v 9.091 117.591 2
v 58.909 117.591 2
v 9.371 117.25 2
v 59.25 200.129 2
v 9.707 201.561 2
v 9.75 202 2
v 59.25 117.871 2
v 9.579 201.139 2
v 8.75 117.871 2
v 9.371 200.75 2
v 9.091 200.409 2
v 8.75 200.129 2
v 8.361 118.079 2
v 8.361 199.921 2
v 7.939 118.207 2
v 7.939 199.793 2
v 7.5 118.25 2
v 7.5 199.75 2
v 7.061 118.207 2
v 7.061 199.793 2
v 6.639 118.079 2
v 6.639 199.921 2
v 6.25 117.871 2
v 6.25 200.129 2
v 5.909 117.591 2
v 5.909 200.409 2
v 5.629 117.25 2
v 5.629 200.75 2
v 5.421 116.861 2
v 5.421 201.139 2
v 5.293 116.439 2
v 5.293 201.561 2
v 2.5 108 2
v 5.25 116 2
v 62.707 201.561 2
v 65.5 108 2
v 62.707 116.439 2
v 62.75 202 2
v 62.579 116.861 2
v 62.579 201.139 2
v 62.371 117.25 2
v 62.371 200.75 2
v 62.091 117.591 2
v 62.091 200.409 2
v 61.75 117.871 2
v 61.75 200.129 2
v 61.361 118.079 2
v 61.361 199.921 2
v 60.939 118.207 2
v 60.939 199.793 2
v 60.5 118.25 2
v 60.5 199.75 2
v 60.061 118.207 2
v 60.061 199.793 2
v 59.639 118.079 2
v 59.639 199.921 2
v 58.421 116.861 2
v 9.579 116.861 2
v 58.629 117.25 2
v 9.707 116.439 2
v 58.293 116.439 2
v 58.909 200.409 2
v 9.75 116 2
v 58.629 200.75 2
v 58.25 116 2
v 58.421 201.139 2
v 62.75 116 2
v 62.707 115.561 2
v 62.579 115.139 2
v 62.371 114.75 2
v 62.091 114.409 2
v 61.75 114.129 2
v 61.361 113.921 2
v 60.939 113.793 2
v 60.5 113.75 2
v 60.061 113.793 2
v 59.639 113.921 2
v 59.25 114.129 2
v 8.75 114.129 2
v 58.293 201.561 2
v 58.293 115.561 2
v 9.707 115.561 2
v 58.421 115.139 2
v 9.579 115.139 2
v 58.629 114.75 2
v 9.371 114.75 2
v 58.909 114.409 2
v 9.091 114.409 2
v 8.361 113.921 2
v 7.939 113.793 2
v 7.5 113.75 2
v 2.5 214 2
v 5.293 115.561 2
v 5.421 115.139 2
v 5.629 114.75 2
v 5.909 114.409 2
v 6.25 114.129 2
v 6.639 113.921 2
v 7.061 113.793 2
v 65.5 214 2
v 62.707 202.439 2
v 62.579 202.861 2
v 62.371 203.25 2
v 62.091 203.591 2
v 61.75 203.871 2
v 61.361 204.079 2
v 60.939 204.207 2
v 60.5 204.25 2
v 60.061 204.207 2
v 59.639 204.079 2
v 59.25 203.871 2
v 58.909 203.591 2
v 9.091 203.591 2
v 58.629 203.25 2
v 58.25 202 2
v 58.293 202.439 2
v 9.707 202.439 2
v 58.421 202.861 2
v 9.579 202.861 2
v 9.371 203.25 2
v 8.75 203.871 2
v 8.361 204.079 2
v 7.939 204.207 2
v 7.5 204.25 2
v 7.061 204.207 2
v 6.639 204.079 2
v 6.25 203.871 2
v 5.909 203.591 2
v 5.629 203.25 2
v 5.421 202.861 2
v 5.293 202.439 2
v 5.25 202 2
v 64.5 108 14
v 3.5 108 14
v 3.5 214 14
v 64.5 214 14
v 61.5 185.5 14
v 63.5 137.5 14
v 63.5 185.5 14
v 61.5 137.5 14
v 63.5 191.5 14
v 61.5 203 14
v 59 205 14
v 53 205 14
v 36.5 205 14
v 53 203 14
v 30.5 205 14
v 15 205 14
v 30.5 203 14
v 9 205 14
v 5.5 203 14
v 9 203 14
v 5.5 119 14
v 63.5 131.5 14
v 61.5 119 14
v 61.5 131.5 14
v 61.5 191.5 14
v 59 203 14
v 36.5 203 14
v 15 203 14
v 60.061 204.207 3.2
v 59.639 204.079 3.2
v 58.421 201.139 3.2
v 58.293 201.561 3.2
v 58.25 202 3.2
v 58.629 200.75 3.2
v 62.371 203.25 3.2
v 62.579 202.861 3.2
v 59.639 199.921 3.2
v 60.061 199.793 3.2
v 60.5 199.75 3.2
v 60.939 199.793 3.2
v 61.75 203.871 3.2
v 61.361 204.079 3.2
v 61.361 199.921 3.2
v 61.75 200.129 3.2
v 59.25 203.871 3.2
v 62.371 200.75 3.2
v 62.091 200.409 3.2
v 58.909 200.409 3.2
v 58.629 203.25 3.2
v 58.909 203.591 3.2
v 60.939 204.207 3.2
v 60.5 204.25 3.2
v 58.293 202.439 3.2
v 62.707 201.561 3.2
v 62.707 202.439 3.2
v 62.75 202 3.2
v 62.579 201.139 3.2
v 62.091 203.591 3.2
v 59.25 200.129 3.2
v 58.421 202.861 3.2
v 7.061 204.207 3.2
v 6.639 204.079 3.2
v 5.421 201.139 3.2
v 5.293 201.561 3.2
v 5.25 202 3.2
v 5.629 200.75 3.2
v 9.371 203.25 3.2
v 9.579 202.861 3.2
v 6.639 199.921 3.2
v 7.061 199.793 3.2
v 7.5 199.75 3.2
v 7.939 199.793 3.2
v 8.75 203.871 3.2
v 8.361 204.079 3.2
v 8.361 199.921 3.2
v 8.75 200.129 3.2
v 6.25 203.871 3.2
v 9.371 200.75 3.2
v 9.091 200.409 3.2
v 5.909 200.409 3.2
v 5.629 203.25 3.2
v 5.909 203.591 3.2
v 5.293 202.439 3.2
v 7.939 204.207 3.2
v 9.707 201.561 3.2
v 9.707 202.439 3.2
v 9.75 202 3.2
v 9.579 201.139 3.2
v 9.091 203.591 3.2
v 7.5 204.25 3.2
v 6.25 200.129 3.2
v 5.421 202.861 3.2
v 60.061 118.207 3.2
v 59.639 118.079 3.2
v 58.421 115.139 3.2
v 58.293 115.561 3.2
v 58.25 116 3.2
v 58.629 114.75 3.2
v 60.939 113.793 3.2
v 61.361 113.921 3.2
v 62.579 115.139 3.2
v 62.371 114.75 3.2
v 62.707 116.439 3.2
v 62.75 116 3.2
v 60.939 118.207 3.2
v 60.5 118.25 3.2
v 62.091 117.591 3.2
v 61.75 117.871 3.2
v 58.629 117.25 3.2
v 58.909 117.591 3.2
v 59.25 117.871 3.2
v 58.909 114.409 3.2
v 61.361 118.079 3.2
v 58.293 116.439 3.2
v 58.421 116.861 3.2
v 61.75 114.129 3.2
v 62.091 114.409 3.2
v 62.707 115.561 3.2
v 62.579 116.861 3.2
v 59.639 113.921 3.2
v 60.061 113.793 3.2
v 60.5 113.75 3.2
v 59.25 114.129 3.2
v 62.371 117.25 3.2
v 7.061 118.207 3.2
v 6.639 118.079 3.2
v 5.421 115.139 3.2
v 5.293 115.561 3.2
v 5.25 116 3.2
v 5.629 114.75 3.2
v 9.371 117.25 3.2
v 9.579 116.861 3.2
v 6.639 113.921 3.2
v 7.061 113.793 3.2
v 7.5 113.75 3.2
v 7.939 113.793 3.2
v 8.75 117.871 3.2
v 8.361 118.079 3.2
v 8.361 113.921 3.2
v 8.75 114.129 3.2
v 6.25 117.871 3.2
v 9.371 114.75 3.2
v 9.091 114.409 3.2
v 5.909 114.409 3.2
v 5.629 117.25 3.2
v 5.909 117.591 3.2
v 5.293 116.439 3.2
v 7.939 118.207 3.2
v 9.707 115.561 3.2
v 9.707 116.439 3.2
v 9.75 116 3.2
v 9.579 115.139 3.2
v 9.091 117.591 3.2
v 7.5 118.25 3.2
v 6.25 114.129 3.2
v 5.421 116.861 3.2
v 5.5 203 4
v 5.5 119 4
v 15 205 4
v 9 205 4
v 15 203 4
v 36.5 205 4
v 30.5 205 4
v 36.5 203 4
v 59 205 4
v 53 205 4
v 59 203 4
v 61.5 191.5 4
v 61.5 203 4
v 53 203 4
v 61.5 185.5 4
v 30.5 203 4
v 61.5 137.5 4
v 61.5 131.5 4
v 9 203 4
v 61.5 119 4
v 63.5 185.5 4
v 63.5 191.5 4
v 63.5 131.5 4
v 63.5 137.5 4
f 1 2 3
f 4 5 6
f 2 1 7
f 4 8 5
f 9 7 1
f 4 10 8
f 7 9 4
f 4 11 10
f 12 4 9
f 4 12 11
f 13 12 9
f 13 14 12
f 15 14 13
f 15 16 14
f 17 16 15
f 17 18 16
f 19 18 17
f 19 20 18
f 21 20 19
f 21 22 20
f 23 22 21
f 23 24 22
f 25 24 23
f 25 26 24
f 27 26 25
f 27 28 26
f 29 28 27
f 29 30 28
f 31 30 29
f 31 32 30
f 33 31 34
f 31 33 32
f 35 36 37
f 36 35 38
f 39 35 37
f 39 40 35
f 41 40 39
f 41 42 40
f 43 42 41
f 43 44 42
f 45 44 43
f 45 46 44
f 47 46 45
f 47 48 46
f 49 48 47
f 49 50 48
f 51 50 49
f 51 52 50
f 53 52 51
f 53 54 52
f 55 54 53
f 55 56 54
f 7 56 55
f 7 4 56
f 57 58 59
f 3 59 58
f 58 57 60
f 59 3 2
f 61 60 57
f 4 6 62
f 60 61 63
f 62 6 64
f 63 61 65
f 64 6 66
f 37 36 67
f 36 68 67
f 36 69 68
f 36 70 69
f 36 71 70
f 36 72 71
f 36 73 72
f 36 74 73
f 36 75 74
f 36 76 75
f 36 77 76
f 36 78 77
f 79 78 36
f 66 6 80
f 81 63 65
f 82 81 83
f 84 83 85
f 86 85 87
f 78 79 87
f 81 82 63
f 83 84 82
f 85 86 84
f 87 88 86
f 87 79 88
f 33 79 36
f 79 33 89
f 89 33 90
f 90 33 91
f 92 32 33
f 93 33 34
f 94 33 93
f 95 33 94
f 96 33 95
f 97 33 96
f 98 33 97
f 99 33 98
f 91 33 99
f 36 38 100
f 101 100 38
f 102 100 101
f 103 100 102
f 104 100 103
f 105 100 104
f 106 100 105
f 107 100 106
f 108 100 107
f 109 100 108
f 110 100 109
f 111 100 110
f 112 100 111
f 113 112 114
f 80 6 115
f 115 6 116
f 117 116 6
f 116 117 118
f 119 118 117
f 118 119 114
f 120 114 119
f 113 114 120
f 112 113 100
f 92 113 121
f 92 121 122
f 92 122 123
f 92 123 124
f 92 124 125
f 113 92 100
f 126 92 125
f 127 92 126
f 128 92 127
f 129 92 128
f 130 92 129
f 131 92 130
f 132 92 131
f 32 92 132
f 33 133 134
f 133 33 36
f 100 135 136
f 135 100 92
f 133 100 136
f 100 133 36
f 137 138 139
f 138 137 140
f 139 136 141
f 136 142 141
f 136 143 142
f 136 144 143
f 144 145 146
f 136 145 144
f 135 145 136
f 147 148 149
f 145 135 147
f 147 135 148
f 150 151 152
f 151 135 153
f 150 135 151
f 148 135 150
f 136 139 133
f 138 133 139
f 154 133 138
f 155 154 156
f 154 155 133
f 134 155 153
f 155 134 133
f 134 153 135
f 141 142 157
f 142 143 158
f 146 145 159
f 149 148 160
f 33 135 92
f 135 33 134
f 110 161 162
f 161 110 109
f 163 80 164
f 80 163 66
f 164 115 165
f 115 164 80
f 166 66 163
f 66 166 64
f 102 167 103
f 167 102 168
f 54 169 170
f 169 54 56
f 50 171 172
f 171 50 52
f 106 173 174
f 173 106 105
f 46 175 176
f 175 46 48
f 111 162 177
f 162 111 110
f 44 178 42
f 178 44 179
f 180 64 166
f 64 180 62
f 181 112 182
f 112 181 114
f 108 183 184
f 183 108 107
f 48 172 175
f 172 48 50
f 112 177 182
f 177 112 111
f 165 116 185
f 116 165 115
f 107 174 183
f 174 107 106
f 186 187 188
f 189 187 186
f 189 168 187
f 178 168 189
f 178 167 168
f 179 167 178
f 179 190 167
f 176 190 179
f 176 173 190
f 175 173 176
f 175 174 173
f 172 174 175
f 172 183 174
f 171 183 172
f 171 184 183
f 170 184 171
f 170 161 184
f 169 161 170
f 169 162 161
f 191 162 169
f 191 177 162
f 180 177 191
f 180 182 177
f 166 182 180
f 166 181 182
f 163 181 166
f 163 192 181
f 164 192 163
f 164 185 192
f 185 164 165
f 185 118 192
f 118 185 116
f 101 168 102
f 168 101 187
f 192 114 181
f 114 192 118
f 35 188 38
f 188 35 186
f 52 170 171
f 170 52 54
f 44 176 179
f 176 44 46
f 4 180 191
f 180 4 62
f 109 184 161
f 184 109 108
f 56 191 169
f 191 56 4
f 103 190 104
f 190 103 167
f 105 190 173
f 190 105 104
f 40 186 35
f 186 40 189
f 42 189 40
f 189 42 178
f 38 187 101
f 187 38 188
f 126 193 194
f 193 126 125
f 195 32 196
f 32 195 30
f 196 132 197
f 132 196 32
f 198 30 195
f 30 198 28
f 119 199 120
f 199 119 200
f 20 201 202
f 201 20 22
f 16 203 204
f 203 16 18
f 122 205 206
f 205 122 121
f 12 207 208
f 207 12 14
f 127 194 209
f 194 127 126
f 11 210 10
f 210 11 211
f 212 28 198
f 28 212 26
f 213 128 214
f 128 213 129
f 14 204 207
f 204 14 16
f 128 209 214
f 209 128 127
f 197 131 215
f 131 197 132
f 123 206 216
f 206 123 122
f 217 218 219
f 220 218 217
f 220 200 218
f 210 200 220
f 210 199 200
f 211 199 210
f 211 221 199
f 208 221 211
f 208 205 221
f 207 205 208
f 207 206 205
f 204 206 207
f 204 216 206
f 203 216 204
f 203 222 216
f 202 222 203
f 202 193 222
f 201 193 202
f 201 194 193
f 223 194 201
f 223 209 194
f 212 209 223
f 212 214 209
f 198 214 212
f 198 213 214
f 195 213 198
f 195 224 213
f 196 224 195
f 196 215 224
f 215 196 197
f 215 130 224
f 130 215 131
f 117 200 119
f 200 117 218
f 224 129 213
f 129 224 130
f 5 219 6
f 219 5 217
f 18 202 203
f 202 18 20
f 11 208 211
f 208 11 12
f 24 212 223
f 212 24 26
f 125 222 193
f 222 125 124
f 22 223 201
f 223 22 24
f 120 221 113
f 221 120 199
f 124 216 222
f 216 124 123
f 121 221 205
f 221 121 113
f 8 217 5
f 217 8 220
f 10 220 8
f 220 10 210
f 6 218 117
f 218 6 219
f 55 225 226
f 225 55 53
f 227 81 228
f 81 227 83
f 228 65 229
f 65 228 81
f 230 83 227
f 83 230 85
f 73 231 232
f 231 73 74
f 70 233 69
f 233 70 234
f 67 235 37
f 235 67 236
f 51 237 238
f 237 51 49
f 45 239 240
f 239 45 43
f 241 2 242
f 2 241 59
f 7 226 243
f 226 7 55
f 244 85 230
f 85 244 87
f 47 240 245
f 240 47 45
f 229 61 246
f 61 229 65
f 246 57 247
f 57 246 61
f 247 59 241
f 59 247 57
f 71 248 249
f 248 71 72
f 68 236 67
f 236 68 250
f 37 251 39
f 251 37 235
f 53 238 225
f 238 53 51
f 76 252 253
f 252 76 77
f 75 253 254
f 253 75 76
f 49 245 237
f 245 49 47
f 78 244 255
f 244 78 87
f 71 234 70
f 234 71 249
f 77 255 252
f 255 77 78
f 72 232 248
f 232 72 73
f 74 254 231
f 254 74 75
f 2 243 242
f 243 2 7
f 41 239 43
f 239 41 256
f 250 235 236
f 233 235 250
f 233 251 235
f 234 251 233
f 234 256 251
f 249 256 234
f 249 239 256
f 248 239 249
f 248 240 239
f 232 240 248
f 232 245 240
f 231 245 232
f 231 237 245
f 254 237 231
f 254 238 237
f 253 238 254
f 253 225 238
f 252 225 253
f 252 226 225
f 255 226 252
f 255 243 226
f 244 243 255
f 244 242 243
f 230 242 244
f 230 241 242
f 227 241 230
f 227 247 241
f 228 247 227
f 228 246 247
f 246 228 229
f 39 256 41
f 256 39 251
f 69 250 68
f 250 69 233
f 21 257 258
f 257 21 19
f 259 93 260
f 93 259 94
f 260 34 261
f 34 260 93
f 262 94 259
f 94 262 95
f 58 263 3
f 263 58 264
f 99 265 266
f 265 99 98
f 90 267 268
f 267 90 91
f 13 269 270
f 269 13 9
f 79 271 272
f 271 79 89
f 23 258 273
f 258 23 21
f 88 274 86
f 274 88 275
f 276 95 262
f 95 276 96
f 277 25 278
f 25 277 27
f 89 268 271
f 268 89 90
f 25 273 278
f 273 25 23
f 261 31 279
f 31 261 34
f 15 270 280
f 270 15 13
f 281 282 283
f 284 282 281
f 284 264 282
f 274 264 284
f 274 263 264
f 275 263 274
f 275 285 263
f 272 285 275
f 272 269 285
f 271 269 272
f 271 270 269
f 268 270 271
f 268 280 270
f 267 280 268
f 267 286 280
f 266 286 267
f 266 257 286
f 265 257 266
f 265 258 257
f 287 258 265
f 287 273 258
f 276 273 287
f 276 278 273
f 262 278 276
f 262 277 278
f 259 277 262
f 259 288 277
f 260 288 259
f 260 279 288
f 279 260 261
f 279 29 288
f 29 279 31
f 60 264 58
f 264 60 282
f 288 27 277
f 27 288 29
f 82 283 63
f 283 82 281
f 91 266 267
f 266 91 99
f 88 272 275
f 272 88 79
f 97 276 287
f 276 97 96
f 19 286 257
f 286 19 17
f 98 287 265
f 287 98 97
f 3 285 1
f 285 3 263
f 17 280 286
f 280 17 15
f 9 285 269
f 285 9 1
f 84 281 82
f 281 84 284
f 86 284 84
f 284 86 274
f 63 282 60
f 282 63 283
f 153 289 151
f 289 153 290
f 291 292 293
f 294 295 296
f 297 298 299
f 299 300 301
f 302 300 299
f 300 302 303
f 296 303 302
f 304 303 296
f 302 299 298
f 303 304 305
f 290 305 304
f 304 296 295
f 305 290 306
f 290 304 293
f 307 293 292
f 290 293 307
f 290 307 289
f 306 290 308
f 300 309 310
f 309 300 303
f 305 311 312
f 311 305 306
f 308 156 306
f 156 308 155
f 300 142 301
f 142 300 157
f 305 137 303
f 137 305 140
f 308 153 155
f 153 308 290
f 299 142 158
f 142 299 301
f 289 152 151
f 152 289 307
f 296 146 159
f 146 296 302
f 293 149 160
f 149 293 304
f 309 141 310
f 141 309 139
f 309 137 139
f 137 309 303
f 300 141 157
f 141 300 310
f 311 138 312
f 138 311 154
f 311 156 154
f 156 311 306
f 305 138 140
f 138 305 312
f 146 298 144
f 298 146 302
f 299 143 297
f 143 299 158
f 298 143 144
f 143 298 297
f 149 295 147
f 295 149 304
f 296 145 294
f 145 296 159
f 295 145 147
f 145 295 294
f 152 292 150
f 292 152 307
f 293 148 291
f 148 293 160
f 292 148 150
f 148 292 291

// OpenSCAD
// file: Commons.scad
arduino_depth = 53.5;
arduino_width = 69;
arduino_mega_width = 102;

raspberry_depth = 56;
raspberry_width = 85;

breadboard_width = 166;
breadboard_depth = 55;
breadboard_height = 10;

mini_breadboard_depth = 34;
mini_breadboard_width = 46;

magnet_height = 1.2;
magnet_diameter = 4;

delta = 0.5;

plate_thickness = 2;
wall_thickness = 2;

slot_width = arduino_mega_width + 2*wall_thickness; // 106
slot_depth = raspberry_depth + 2*wall_thickness + 2 + 2*delta; // 63

width = 2*slot_width + wall_thickness; // 214
depth = slot_depth + breadboard_depth + 3*wall_thickness + 1 + 4*delta; // 125
height = breadboard_height + plate_thickness; // height over plate, 12

small_slot_depth = depth - slot_depth - 2*wall_thickness - 2*delta; // 58
small_slot_width = width - breadboard_width - 3*wall_thickness - 1 - 4*delta; // 39


module module_frame() {
    difference() {
        union() {
            translate([wall_thickness + 1, 0, 0])
                cube([slot_depth - 2*wall_thickness - 2, slot_width, plate_thickness]);

            translate([0, slot_width, 0]) rotate([90, 0, 0]) linear_extrude(slot_width)
                polygon([[0, 0], [1, height], [3, height], [3, 0]]);

            translate([slot_depth - wall_thickness - 1, slot_width, 0]) rotate([90, 0, 0]) linear_extrude(slot_width)
                polygon([[0, 0], [0, height], [wall_thickness, height], [3, 0]]);
        }
        
        magnet_hole(5, wall_thickness + 10, -delta);
        magnet_hole(slot_depth - 5, wall_thickness + 10, -delta);
        magnet_hole(5, wall_thickness + slot_width - 10, -delta);
        magnet_hole(slot_depth - 5, wall_thickness + slot_width - 10, -delta);       
    }

    translate([wall_thickness + 1, slot_width - 1, plate_thickness])
        cube([slot_depth - 2*wall_thickness - 2, 1, height - plate_thickness]);
}

module small_module_frame() {
    difference() {
        union() {
            translate([0, wall_thickness + 1, 0])
                cube([small_slot_depth, small_slot_width - 2*wall_thickness - 2, plate_thickness]);

            rotate([90, 0, 90]) linear_extrude(small_slot_depth)
                polygon([[0, 0], [1, height], [wall_thickness + 1, height], [wall_thickness + 1, 0]]);

            translate([0, small_slot_width - wall_thickness - 1, 0]) rotate([90, 0, 90]) linear_extrude(small_slot_depth)
                polygon([[0, 0], [0, height], [wall_thickness, height], [wall_thickness + 1, 0]]);

            translate([0, wall_thickness + 1, 0])
                cube([1, small_slot_width - 2*wall_thickness - 2, height]);
        }
        
        magnet_hole(8, 8, -delta);
        magnet_hole(8, small_slot_width - 8, -delta);
        magnet_hole(small_slot_depth - 8, 8, -delta);
        magnet_hole(small_slot_depth - 8, small_slot_width - 8, -delta);
    }
}

module breadboard_hole() {
    cube([breadboard_depth + 2*delta, breadboard_width + 2*delta, breadboard_height + delta]);
    
    translate([breadboard_depth - delta, 11 + delta, 0])
        cube([2.5, 6, breadboard_height + delta]);
    translate([breadboard_depth - delta, breadboard_width/2 - 3 + delta, 0])
        cube([2.5, 6, breadboard_height + delta]);
    translate([breadboard_depth - delta, breadboard_width - 17 - delta, 0])
        cube([2.5, 6, breadboard_height + delta]);
}

module half_breadboard_hole() {
    cube([breadboard_depth + 2*delta, breadboard_width/2 + 2*delta, breadboard_height + delta]);
    
    translate([-2, 11 + delta, 0])
        cube([2.5, 6, breadboard_height + delta]);
    translate([-2, breadboard_width/2 - 17 - delta, 0])
        cube([2.5, 6, breadboard_height + delta]);
    translate([2 + delta, -2, 0])
        cube([6, 2.5, breadboard_height + delta]);
    translate([breadboard_depth/2 - 3 + delta, -2, 0])
        cube([6, 2.5, breadboard_height + delta]);
    translate([breadboard_depth - 8 - delta, -2, 0])
        cube([6, 2.5, breadboard_height + delta]);
}

module mini_breadboard_hole() {
    cube([mini_breadboard_depth + 2*delta, mini_breadboard_width + 2*delta, breadboard_height + delta]);
    
    translate([-2, mini_breadboard_width/2 - 3 + delta, 0])
        cube([2.5, 6, breadboard_height + delta]);
    translate([mini_breadboard_depth/2 - 3 + delta, mini_breadboard_width + 2*delta - 0.5, 0])
        cube([6, 2.5, breadboard_height + delta]);
}

module magnet_hole(x, y, z) {
    translate([x, y, z])
        cylinder(h = magnet_height + delta, d = magnet_diameter + delta, $fn=32);
}

module screw_mount(x = 0, y = 0, z = 0, h = 5) {
    holeRadius = 3 / 2;

    translate([x, y, z])
        difference() {
            cylinder(h, r1 = holeRadius + 2, r2 = holeRadius + 1);
            
            translate([0, 0, -0.5])
                cylinder(h + 1, r = holeRadius);
        }
}
// main file
include <Commons.scad>

translate([slot_depth + wall_thickness + delta, 2*slot_width + wall_thickness, plate_thickness]) rotate([0, 0, 180])
    Half_Breadboard_Module();

module Half_Breadboard_Module() {
    difference() {
        union() {
            module_frame();

            translate([wall_thickness + 1, 0, plate_thickness])
                cube([slot_depth - 2*wall_thickness - 2, slot_width, breadboard_height]);
        }

        translate([wall_thickness + 2, (slot_width - breadboard_width/2 - 2*delta)/2, plate_thickness])
            half_breadboard_hole();
    }
}
